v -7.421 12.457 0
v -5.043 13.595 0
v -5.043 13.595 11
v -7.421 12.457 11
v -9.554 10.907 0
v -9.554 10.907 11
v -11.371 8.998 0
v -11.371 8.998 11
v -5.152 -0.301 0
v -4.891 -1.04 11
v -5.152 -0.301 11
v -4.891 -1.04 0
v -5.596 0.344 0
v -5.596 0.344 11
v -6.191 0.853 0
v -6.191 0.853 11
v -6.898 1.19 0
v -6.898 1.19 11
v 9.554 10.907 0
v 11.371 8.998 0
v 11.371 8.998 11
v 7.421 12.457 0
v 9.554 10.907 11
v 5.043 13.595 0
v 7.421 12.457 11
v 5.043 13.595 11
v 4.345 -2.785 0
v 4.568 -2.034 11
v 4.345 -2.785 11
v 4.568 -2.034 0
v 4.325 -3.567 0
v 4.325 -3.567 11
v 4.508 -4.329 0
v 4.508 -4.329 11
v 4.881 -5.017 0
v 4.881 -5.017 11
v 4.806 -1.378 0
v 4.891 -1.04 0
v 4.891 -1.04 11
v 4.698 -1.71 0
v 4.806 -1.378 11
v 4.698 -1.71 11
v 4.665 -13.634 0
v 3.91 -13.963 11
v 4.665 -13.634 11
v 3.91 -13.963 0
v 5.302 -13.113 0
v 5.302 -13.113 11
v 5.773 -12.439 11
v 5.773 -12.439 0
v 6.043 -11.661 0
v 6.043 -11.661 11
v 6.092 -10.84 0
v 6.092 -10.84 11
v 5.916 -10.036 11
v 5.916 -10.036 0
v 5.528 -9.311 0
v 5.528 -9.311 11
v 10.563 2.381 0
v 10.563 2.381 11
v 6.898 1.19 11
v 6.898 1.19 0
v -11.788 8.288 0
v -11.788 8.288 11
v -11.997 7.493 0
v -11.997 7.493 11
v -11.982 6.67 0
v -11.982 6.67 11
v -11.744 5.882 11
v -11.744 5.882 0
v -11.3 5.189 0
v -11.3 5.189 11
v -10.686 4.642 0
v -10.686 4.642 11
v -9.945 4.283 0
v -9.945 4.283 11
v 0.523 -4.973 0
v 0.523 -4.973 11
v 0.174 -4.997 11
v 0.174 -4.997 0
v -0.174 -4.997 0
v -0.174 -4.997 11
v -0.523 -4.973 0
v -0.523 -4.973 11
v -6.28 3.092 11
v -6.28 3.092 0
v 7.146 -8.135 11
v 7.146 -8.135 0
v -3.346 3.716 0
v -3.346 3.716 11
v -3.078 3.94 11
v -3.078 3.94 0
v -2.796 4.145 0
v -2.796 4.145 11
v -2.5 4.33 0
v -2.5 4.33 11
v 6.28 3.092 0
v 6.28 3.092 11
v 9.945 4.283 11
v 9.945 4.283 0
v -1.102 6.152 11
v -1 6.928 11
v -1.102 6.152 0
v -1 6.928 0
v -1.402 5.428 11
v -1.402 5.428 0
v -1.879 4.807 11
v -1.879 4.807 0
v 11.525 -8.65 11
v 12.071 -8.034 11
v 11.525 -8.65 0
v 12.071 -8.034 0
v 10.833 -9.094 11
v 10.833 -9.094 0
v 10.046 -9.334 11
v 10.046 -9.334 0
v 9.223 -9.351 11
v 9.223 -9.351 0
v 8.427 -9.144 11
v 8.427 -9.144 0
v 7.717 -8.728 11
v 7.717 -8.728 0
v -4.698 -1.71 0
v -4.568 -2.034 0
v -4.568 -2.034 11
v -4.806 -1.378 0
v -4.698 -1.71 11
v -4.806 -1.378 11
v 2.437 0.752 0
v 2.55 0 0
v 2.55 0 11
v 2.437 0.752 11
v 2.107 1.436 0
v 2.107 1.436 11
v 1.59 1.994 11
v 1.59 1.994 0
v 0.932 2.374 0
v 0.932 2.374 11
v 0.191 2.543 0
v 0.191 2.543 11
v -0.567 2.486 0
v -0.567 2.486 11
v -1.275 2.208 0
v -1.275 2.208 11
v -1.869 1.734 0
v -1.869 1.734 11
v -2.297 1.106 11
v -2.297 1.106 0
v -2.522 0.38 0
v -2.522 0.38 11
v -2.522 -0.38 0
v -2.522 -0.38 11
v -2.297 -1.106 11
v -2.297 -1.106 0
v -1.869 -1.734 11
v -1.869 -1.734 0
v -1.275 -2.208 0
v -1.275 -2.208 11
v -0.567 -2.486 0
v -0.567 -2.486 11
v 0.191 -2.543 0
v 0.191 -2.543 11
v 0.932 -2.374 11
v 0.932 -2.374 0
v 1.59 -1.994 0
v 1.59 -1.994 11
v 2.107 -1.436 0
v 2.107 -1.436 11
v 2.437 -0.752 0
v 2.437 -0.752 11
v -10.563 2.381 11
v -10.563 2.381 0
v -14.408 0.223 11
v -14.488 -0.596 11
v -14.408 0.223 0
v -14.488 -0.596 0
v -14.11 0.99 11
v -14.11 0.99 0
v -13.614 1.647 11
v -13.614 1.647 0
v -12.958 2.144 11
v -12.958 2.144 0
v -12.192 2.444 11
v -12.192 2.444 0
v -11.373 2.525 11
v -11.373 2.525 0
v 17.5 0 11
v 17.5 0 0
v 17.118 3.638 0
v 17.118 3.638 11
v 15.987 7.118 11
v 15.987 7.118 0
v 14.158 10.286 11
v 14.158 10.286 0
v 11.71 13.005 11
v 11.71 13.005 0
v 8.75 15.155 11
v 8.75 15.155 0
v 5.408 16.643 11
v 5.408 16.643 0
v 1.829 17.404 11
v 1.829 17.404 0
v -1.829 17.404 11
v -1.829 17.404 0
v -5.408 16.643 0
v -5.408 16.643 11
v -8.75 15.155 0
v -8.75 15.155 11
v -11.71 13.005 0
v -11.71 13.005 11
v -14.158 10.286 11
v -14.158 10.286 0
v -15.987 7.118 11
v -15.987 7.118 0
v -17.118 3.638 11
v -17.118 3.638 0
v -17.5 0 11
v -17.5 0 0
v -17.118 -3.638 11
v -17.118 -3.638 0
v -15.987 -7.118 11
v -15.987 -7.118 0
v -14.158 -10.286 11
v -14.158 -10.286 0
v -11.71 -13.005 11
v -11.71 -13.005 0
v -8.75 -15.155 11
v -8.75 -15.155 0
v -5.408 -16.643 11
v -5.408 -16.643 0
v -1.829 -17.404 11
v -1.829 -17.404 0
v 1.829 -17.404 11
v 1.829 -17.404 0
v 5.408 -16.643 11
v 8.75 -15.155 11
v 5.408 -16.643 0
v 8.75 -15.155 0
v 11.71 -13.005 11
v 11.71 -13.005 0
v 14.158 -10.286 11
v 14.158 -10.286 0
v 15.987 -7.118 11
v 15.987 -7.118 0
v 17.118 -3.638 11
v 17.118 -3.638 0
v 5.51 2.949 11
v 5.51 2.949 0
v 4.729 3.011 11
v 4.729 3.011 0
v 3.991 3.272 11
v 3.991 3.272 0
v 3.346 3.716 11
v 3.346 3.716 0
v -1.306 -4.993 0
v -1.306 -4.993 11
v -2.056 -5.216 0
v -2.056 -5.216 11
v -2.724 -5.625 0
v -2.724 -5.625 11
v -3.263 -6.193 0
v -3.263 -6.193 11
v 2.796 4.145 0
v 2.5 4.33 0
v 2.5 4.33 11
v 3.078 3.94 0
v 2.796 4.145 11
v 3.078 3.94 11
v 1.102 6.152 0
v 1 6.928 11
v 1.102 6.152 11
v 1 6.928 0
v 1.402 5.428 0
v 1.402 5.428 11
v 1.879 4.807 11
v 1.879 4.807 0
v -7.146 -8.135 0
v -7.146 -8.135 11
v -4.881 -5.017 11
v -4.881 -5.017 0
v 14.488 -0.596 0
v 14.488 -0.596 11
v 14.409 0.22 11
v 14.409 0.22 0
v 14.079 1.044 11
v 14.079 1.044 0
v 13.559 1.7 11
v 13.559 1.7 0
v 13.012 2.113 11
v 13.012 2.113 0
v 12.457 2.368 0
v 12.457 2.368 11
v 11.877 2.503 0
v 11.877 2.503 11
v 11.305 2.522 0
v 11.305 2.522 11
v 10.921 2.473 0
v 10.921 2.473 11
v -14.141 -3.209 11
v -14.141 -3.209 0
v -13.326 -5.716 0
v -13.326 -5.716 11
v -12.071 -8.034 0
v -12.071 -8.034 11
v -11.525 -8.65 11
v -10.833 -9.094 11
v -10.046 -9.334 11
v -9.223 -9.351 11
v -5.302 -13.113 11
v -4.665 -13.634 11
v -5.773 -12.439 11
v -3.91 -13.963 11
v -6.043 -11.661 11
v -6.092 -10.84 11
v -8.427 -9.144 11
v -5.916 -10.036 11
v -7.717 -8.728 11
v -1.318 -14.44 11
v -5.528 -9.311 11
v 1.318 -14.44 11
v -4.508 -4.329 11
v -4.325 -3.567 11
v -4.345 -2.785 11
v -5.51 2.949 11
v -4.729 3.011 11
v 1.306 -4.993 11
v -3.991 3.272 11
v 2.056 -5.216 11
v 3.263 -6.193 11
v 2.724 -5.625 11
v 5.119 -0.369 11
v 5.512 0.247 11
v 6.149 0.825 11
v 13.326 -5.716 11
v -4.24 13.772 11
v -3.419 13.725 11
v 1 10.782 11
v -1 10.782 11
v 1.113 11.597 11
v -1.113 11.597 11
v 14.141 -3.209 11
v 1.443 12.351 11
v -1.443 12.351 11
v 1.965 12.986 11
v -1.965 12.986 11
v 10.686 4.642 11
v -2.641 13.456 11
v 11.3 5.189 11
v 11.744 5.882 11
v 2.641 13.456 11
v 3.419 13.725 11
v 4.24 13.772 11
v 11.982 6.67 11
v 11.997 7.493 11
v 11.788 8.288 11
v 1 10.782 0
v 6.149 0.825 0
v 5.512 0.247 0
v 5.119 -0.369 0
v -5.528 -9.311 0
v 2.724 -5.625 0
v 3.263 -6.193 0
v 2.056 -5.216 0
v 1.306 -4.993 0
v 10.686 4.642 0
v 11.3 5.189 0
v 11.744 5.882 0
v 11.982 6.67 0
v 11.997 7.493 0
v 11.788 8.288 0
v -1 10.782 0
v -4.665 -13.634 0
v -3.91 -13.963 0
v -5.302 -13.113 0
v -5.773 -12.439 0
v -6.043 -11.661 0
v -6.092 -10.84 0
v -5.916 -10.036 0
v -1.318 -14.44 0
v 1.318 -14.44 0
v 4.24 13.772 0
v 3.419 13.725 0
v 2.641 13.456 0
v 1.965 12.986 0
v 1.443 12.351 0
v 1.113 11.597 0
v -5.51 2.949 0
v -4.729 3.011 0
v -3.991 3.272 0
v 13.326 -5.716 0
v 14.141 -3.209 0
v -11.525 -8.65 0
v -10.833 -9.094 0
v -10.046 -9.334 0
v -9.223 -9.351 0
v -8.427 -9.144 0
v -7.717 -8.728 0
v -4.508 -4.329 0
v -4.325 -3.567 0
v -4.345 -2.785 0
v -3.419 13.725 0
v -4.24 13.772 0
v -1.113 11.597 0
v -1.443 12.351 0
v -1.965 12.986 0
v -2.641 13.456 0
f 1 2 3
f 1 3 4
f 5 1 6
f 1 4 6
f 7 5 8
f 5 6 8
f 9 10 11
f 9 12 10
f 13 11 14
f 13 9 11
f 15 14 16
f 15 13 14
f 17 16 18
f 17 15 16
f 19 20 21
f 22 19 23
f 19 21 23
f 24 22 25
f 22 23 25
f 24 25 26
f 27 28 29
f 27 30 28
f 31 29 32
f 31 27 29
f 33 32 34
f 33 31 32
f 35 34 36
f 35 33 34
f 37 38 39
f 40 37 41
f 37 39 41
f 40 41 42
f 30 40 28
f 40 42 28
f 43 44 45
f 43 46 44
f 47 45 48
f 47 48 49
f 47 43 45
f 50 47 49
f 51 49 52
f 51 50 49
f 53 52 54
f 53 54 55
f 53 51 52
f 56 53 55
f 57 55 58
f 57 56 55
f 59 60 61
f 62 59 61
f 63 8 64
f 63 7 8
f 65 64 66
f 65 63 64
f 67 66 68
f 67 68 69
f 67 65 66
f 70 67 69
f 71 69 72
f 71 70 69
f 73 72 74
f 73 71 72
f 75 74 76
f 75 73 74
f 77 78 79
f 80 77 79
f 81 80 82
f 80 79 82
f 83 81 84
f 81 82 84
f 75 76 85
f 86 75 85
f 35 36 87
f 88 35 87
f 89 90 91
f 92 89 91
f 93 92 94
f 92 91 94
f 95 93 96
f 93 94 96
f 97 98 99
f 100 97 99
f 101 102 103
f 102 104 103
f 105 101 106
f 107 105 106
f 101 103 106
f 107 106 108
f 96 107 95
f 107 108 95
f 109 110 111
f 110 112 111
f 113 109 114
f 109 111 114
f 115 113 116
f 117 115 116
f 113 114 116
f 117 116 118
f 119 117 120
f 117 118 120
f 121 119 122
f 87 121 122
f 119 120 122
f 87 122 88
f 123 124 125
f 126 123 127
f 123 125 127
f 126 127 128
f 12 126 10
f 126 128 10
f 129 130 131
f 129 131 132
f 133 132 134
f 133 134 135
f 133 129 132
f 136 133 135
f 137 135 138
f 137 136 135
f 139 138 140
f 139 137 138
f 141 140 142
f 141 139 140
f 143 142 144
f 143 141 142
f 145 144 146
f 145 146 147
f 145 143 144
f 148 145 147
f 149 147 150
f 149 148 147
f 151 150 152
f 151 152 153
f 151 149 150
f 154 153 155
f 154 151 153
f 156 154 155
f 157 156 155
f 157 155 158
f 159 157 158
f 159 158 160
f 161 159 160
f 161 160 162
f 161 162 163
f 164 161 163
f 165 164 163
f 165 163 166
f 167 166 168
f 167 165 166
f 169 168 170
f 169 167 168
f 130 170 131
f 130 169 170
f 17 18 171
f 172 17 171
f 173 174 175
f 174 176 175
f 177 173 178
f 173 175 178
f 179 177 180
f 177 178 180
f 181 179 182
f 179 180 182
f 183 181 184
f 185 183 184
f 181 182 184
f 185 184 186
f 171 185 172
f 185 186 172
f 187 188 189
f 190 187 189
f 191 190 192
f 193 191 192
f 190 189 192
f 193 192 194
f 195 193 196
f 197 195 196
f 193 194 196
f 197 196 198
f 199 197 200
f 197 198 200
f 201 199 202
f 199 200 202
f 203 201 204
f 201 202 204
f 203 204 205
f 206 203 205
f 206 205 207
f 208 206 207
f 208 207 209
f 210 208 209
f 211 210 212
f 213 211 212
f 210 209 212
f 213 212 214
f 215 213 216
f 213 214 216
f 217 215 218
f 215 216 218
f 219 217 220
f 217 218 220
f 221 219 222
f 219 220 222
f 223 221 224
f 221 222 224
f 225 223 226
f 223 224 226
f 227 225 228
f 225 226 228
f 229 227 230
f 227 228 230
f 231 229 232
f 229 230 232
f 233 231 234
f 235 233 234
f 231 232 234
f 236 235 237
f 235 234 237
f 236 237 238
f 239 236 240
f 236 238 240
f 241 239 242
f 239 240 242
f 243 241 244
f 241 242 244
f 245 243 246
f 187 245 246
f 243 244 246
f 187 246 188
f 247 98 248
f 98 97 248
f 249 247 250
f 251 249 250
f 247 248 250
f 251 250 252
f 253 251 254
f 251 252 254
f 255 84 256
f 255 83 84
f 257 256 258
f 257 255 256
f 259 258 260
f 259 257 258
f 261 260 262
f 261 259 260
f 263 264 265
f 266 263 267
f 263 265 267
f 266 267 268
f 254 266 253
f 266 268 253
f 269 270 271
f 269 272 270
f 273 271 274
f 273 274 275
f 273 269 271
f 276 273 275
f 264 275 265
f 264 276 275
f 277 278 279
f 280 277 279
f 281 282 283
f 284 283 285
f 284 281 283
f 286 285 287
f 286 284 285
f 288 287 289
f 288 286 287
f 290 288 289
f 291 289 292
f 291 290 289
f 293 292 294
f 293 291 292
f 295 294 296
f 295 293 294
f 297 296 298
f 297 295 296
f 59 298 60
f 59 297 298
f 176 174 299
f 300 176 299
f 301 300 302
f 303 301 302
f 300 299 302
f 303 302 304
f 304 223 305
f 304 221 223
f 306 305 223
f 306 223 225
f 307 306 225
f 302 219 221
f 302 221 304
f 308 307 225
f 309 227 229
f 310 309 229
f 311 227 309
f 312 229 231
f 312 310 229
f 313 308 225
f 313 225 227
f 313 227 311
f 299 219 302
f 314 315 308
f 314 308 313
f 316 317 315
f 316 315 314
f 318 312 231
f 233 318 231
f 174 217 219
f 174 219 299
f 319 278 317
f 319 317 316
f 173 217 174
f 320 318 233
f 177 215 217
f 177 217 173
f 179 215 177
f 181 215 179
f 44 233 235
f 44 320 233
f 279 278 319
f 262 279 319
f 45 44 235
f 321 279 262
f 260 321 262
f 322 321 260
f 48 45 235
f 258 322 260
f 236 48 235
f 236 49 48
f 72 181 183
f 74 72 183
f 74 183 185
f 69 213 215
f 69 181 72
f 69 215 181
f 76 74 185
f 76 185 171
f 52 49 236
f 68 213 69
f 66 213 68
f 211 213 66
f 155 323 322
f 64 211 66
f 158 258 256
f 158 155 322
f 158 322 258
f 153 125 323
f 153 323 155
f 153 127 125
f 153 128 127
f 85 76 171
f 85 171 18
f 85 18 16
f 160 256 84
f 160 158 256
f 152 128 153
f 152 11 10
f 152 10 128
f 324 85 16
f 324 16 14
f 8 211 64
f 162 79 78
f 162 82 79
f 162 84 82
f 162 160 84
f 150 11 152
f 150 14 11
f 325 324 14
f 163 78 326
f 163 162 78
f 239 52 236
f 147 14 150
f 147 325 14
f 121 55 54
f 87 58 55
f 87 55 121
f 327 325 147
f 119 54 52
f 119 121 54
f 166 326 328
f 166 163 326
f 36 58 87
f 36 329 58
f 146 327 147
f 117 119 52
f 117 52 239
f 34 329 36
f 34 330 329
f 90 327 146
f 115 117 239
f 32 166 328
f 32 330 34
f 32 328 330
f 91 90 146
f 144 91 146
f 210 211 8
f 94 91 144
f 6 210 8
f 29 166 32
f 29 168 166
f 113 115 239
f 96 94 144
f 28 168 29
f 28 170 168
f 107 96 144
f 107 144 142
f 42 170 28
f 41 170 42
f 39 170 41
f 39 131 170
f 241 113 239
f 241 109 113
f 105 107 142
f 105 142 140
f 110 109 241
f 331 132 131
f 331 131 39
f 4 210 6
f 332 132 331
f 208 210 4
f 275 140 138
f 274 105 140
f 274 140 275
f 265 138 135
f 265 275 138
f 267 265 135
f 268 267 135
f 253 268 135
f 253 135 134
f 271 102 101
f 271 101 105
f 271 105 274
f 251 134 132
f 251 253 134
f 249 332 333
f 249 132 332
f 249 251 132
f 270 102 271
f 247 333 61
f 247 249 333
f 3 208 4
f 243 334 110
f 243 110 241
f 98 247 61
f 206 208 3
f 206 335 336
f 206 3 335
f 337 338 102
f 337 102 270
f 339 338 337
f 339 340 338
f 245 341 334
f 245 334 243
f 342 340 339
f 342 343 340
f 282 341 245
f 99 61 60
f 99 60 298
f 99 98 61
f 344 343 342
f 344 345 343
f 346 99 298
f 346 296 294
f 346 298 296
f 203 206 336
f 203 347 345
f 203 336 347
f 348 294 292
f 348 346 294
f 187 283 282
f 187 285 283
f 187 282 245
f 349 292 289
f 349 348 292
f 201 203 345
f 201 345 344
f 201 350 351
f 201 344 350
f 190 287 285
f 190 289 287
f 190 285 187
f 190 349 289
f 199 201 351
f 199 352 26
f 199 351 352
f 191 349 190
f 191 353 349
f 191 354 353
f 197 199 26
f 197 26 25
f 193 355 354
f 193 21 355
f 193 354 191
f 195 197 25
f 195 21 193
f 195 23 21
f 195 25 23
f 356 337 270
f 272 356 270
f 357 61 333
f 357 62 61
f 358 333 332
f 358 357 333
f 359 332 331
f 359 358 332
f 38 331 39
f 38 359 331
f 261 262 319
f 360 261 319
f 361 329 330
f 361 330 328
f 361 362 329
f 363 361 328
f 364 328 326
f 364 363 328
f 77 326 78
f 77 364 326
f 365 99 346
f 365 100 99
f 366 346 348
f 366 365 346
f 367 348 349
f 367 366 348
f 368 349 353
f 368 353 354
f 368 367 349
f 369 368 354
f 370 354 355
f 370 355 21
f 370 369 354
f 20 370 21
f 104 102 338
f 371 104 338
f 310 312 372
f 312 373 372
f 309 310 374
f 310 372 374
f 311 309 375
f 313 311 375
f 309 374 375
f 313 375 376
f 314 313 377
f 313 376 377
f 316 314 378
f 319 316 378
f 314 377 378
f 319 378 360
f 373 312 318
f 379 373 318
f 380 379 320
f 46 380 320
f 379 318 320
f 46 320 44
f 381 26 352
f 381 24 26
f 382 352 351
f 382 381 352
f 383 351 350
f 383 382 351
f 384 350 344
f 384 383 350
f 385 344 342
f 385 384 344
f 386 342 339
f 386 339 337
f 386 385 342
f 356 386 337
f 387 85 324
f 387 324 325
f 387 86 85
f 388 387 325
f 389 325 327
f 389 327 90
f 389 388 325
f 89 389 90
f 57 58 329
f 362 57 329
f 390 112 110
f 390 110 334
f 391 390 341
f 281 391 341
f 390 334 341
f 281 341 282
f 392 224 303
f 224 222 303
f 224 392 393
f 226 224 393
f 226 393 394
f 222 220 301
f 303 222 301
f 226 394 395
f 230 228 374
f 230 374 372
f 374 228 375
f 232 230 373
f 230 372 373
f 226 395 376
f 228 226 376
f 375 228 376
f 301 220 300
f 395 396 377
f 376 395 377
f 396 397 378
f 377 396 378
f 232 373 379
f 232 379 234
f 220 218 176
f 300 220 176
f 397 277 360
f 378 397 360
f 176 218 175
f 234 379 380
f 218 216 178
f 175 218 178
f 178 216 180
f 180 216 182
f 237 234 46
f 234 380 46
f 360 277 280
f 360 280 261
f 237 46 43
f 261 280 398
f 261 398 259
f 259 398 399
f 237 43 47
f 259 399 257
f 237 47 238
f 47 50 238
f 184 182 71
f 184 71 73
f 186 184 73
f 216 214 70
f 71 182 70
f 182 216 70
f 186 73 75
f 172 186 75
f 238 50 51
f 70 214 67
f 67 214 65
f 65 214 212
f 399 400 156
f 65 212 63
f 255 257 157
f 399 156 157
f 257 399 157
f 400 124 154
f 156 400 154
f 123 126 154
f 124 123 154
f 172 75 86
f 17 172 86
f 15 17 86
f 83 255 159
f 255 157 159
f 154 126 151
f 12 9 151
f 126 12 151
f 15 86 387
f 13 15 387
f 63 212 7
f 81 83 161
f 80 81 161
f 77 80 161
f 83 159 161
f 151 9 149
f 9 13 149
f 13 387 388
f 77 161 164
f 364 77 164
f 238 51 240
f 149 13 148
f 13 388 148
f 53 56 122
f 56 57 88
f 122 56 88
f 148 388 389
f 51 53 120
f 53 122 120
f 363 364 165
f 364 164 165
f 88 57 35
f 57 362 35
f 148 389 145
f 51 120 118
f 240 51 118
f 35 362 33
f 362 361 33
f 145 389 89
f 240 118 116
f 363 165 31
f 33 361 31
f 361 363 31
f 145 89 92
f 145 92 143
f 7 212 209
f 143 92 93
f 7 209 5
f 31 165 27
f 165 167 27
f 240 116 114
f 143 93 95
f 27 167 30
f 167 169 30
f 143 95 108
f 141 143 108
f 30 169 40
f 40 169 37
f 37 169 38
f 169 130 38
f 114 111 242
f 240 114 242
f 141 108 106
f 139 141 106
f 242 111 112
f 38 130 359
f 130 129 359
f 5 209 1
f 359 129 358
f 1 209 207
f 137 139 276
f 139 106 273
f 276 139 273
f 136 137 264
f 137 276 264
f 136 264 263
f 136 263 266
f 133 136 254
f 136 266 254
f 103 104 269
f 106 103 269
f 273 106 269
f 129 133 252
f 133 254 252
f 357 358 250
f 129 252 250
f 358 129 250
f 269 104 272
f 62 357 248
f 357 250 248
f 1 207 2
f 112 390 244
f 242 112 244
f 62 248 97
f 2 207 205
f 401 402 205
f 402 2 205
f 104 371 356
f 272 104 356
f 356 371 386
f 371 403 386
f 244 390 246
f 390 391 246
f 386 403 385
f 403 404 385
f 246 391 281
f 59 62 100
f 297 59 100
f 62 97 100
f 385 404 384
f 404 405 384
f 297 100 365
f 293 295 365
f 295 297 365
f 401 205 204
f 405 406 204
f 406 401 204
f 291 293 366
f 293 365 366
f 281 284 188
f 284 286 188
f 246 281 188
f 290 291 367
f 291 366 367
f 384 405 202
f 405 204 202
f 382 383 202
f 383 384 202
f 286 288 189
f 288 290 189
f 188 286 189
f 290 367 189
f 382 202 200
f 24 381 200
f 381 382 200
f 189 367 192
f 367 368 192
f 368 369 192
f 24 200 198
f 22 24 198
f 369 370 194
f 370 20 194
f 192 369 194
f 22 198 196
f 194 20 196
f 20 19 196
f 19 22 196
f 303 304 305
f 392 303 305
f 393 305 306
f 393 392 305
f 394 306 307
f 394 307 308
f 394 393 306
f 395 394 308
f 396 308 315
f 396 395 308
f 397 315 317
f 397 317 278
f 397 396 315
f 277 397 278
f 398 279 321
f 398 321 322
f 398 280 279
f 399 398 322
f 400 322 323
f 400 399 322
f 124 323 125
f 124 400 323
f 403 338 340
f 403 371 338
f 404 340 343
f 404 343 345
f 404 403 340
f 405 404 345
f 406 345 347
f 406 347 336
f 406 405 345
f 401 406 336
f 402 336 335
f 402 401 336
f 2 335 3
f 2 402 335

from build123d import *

# Parameters (mm, degrees)
F0_R     = 17.5
F0_R_2   = 2.55
F1_DEPTH = 11
F3_DEPTH = 25
F4_R     = 3


with BuildPart() as f1:
    # F0 (on Top) → F1 (new body)
    with BuildSketch(Plane.XY):
        Circle(F0_R)
        Circle(F0_R_2, mode=Mode.SUBTRACT)
    extrude(amount=F1_DEPTH)

    # F2 (on face) → F3 (cut)
    with BuildSketch(Plane.XY.offset(11)):
        with BuildLine():
            Line((-1, 4.898979), (-1, 14.465476))
            ThreePointArc((-1, 14.465476), (-8.522886, 11.730746), (-13.448468, 5.421134))
            Line((-13.448468, 5.421134), (-4.350189, 2.464924))
            ThreePointArc((-4.350189, 2.464924), (-2.938926, 4.045085), (-1, 4.898979))
        make_face()
        with BuildLine():
            Line((4.350189, 2.464924), (13.448468, 5.421134))
            ThreePointArc((13.448468, 5.421134), (8.522886, 11.730746), (1, 14.465476))
            Line((1, 14.465476), (1, 4.898979))
            ThreePointArc((1, 4.898979), (2.938926, 4.045085), (4.350189, 2.464924))
        make_face()
        with BuildLine():
            ThreePointArc((9.311611, -11.115031), (13.139033, -6.133174), (14.5, 0))
            ThreePointArc((14.5, 0), (14.391218, 1.772811), (14.066502, 3.519021))
            Line((14.066502, 3.519021), (4.968223, 0.562811))
            ThreePointArc((4.968223, 0.562811), (4.99205, 0.281854), (5, 0))
            ThreePointArc((5, 0), (4.660624, -1.810687), (3.688565, -3.375572))
            Line((3.688565, -3.375572), (9.311611, -11.115031))
        make_face()
        with BuildLine():
            ThreePointArc((-7.693577, -12.290601), (0, -14.5), (7.693577, -12.290601))
            Line((7.693577, -12.290601), (2.070531, -4.551143))
            ThreePointArc((2.070531, -4.551143), (0, -5), (-2.070531, -4.551143))
            Line((-2.070531, -4.551143), (-7.693577, -12.290601))
        make_face()
        with BuildLine():
            ThreePointArc((-14.066502, 3.519021), (-13.790319, -4.480746), (-9.311611, -11.115031))
            Line((-9.311611, -11.115031), (-3.688565, -3.375572))
            ThreePointArc((-3.688565, -3.375572), (-4.755283, -1.545085), (-4.968223, 0.562811))
            Line((-4.968223, 0.562811), (-14.066502, 3.519021))
        make_face()
    extrude(amount=-F3_DEPTH, mode=Mode.SUBTRACT)

    # F4
    f4_edges = [f1.edges().sort_by_distance(p)[0] for p in [
        (-1, 4.898979, 5.5),
        (-4.350189, 2.464924, 5.5),
        (1, 4.898979, 5.5),
        (4.350189, 2.464924, 5.5),
        (3.688565, -3.375572, 5.5),
        (4.968223, 0.562811, 5.5),
        (2.070531, -4.551143, 5.5),
        (-2.070531, -4.551143, 5.5),
        (-4.968223, 0.562811, 5.5),
        (-3.688565, -3.375572, 5.5),
        (13.448468, 5.421134, 5.5),
        (14.066502, 3.519021, 5.5),
        (1, 14.465476, 5.5),
        (-1, 14.465476, 5.5),
        (-13.448468, 5.421134, 5.5),
        (9.311611, -11.115031, 5.5),
        (-9.311611, -11.115031, 5.5),
        (-14.066502, 3.519021, 5.5),
        (7.693577, -12.290601, 5.5),
        (-7.693577, -12.290601, 5.5),
    ]]
    fillet(f4_edges, radius=F4_R)


solid = f1.part
